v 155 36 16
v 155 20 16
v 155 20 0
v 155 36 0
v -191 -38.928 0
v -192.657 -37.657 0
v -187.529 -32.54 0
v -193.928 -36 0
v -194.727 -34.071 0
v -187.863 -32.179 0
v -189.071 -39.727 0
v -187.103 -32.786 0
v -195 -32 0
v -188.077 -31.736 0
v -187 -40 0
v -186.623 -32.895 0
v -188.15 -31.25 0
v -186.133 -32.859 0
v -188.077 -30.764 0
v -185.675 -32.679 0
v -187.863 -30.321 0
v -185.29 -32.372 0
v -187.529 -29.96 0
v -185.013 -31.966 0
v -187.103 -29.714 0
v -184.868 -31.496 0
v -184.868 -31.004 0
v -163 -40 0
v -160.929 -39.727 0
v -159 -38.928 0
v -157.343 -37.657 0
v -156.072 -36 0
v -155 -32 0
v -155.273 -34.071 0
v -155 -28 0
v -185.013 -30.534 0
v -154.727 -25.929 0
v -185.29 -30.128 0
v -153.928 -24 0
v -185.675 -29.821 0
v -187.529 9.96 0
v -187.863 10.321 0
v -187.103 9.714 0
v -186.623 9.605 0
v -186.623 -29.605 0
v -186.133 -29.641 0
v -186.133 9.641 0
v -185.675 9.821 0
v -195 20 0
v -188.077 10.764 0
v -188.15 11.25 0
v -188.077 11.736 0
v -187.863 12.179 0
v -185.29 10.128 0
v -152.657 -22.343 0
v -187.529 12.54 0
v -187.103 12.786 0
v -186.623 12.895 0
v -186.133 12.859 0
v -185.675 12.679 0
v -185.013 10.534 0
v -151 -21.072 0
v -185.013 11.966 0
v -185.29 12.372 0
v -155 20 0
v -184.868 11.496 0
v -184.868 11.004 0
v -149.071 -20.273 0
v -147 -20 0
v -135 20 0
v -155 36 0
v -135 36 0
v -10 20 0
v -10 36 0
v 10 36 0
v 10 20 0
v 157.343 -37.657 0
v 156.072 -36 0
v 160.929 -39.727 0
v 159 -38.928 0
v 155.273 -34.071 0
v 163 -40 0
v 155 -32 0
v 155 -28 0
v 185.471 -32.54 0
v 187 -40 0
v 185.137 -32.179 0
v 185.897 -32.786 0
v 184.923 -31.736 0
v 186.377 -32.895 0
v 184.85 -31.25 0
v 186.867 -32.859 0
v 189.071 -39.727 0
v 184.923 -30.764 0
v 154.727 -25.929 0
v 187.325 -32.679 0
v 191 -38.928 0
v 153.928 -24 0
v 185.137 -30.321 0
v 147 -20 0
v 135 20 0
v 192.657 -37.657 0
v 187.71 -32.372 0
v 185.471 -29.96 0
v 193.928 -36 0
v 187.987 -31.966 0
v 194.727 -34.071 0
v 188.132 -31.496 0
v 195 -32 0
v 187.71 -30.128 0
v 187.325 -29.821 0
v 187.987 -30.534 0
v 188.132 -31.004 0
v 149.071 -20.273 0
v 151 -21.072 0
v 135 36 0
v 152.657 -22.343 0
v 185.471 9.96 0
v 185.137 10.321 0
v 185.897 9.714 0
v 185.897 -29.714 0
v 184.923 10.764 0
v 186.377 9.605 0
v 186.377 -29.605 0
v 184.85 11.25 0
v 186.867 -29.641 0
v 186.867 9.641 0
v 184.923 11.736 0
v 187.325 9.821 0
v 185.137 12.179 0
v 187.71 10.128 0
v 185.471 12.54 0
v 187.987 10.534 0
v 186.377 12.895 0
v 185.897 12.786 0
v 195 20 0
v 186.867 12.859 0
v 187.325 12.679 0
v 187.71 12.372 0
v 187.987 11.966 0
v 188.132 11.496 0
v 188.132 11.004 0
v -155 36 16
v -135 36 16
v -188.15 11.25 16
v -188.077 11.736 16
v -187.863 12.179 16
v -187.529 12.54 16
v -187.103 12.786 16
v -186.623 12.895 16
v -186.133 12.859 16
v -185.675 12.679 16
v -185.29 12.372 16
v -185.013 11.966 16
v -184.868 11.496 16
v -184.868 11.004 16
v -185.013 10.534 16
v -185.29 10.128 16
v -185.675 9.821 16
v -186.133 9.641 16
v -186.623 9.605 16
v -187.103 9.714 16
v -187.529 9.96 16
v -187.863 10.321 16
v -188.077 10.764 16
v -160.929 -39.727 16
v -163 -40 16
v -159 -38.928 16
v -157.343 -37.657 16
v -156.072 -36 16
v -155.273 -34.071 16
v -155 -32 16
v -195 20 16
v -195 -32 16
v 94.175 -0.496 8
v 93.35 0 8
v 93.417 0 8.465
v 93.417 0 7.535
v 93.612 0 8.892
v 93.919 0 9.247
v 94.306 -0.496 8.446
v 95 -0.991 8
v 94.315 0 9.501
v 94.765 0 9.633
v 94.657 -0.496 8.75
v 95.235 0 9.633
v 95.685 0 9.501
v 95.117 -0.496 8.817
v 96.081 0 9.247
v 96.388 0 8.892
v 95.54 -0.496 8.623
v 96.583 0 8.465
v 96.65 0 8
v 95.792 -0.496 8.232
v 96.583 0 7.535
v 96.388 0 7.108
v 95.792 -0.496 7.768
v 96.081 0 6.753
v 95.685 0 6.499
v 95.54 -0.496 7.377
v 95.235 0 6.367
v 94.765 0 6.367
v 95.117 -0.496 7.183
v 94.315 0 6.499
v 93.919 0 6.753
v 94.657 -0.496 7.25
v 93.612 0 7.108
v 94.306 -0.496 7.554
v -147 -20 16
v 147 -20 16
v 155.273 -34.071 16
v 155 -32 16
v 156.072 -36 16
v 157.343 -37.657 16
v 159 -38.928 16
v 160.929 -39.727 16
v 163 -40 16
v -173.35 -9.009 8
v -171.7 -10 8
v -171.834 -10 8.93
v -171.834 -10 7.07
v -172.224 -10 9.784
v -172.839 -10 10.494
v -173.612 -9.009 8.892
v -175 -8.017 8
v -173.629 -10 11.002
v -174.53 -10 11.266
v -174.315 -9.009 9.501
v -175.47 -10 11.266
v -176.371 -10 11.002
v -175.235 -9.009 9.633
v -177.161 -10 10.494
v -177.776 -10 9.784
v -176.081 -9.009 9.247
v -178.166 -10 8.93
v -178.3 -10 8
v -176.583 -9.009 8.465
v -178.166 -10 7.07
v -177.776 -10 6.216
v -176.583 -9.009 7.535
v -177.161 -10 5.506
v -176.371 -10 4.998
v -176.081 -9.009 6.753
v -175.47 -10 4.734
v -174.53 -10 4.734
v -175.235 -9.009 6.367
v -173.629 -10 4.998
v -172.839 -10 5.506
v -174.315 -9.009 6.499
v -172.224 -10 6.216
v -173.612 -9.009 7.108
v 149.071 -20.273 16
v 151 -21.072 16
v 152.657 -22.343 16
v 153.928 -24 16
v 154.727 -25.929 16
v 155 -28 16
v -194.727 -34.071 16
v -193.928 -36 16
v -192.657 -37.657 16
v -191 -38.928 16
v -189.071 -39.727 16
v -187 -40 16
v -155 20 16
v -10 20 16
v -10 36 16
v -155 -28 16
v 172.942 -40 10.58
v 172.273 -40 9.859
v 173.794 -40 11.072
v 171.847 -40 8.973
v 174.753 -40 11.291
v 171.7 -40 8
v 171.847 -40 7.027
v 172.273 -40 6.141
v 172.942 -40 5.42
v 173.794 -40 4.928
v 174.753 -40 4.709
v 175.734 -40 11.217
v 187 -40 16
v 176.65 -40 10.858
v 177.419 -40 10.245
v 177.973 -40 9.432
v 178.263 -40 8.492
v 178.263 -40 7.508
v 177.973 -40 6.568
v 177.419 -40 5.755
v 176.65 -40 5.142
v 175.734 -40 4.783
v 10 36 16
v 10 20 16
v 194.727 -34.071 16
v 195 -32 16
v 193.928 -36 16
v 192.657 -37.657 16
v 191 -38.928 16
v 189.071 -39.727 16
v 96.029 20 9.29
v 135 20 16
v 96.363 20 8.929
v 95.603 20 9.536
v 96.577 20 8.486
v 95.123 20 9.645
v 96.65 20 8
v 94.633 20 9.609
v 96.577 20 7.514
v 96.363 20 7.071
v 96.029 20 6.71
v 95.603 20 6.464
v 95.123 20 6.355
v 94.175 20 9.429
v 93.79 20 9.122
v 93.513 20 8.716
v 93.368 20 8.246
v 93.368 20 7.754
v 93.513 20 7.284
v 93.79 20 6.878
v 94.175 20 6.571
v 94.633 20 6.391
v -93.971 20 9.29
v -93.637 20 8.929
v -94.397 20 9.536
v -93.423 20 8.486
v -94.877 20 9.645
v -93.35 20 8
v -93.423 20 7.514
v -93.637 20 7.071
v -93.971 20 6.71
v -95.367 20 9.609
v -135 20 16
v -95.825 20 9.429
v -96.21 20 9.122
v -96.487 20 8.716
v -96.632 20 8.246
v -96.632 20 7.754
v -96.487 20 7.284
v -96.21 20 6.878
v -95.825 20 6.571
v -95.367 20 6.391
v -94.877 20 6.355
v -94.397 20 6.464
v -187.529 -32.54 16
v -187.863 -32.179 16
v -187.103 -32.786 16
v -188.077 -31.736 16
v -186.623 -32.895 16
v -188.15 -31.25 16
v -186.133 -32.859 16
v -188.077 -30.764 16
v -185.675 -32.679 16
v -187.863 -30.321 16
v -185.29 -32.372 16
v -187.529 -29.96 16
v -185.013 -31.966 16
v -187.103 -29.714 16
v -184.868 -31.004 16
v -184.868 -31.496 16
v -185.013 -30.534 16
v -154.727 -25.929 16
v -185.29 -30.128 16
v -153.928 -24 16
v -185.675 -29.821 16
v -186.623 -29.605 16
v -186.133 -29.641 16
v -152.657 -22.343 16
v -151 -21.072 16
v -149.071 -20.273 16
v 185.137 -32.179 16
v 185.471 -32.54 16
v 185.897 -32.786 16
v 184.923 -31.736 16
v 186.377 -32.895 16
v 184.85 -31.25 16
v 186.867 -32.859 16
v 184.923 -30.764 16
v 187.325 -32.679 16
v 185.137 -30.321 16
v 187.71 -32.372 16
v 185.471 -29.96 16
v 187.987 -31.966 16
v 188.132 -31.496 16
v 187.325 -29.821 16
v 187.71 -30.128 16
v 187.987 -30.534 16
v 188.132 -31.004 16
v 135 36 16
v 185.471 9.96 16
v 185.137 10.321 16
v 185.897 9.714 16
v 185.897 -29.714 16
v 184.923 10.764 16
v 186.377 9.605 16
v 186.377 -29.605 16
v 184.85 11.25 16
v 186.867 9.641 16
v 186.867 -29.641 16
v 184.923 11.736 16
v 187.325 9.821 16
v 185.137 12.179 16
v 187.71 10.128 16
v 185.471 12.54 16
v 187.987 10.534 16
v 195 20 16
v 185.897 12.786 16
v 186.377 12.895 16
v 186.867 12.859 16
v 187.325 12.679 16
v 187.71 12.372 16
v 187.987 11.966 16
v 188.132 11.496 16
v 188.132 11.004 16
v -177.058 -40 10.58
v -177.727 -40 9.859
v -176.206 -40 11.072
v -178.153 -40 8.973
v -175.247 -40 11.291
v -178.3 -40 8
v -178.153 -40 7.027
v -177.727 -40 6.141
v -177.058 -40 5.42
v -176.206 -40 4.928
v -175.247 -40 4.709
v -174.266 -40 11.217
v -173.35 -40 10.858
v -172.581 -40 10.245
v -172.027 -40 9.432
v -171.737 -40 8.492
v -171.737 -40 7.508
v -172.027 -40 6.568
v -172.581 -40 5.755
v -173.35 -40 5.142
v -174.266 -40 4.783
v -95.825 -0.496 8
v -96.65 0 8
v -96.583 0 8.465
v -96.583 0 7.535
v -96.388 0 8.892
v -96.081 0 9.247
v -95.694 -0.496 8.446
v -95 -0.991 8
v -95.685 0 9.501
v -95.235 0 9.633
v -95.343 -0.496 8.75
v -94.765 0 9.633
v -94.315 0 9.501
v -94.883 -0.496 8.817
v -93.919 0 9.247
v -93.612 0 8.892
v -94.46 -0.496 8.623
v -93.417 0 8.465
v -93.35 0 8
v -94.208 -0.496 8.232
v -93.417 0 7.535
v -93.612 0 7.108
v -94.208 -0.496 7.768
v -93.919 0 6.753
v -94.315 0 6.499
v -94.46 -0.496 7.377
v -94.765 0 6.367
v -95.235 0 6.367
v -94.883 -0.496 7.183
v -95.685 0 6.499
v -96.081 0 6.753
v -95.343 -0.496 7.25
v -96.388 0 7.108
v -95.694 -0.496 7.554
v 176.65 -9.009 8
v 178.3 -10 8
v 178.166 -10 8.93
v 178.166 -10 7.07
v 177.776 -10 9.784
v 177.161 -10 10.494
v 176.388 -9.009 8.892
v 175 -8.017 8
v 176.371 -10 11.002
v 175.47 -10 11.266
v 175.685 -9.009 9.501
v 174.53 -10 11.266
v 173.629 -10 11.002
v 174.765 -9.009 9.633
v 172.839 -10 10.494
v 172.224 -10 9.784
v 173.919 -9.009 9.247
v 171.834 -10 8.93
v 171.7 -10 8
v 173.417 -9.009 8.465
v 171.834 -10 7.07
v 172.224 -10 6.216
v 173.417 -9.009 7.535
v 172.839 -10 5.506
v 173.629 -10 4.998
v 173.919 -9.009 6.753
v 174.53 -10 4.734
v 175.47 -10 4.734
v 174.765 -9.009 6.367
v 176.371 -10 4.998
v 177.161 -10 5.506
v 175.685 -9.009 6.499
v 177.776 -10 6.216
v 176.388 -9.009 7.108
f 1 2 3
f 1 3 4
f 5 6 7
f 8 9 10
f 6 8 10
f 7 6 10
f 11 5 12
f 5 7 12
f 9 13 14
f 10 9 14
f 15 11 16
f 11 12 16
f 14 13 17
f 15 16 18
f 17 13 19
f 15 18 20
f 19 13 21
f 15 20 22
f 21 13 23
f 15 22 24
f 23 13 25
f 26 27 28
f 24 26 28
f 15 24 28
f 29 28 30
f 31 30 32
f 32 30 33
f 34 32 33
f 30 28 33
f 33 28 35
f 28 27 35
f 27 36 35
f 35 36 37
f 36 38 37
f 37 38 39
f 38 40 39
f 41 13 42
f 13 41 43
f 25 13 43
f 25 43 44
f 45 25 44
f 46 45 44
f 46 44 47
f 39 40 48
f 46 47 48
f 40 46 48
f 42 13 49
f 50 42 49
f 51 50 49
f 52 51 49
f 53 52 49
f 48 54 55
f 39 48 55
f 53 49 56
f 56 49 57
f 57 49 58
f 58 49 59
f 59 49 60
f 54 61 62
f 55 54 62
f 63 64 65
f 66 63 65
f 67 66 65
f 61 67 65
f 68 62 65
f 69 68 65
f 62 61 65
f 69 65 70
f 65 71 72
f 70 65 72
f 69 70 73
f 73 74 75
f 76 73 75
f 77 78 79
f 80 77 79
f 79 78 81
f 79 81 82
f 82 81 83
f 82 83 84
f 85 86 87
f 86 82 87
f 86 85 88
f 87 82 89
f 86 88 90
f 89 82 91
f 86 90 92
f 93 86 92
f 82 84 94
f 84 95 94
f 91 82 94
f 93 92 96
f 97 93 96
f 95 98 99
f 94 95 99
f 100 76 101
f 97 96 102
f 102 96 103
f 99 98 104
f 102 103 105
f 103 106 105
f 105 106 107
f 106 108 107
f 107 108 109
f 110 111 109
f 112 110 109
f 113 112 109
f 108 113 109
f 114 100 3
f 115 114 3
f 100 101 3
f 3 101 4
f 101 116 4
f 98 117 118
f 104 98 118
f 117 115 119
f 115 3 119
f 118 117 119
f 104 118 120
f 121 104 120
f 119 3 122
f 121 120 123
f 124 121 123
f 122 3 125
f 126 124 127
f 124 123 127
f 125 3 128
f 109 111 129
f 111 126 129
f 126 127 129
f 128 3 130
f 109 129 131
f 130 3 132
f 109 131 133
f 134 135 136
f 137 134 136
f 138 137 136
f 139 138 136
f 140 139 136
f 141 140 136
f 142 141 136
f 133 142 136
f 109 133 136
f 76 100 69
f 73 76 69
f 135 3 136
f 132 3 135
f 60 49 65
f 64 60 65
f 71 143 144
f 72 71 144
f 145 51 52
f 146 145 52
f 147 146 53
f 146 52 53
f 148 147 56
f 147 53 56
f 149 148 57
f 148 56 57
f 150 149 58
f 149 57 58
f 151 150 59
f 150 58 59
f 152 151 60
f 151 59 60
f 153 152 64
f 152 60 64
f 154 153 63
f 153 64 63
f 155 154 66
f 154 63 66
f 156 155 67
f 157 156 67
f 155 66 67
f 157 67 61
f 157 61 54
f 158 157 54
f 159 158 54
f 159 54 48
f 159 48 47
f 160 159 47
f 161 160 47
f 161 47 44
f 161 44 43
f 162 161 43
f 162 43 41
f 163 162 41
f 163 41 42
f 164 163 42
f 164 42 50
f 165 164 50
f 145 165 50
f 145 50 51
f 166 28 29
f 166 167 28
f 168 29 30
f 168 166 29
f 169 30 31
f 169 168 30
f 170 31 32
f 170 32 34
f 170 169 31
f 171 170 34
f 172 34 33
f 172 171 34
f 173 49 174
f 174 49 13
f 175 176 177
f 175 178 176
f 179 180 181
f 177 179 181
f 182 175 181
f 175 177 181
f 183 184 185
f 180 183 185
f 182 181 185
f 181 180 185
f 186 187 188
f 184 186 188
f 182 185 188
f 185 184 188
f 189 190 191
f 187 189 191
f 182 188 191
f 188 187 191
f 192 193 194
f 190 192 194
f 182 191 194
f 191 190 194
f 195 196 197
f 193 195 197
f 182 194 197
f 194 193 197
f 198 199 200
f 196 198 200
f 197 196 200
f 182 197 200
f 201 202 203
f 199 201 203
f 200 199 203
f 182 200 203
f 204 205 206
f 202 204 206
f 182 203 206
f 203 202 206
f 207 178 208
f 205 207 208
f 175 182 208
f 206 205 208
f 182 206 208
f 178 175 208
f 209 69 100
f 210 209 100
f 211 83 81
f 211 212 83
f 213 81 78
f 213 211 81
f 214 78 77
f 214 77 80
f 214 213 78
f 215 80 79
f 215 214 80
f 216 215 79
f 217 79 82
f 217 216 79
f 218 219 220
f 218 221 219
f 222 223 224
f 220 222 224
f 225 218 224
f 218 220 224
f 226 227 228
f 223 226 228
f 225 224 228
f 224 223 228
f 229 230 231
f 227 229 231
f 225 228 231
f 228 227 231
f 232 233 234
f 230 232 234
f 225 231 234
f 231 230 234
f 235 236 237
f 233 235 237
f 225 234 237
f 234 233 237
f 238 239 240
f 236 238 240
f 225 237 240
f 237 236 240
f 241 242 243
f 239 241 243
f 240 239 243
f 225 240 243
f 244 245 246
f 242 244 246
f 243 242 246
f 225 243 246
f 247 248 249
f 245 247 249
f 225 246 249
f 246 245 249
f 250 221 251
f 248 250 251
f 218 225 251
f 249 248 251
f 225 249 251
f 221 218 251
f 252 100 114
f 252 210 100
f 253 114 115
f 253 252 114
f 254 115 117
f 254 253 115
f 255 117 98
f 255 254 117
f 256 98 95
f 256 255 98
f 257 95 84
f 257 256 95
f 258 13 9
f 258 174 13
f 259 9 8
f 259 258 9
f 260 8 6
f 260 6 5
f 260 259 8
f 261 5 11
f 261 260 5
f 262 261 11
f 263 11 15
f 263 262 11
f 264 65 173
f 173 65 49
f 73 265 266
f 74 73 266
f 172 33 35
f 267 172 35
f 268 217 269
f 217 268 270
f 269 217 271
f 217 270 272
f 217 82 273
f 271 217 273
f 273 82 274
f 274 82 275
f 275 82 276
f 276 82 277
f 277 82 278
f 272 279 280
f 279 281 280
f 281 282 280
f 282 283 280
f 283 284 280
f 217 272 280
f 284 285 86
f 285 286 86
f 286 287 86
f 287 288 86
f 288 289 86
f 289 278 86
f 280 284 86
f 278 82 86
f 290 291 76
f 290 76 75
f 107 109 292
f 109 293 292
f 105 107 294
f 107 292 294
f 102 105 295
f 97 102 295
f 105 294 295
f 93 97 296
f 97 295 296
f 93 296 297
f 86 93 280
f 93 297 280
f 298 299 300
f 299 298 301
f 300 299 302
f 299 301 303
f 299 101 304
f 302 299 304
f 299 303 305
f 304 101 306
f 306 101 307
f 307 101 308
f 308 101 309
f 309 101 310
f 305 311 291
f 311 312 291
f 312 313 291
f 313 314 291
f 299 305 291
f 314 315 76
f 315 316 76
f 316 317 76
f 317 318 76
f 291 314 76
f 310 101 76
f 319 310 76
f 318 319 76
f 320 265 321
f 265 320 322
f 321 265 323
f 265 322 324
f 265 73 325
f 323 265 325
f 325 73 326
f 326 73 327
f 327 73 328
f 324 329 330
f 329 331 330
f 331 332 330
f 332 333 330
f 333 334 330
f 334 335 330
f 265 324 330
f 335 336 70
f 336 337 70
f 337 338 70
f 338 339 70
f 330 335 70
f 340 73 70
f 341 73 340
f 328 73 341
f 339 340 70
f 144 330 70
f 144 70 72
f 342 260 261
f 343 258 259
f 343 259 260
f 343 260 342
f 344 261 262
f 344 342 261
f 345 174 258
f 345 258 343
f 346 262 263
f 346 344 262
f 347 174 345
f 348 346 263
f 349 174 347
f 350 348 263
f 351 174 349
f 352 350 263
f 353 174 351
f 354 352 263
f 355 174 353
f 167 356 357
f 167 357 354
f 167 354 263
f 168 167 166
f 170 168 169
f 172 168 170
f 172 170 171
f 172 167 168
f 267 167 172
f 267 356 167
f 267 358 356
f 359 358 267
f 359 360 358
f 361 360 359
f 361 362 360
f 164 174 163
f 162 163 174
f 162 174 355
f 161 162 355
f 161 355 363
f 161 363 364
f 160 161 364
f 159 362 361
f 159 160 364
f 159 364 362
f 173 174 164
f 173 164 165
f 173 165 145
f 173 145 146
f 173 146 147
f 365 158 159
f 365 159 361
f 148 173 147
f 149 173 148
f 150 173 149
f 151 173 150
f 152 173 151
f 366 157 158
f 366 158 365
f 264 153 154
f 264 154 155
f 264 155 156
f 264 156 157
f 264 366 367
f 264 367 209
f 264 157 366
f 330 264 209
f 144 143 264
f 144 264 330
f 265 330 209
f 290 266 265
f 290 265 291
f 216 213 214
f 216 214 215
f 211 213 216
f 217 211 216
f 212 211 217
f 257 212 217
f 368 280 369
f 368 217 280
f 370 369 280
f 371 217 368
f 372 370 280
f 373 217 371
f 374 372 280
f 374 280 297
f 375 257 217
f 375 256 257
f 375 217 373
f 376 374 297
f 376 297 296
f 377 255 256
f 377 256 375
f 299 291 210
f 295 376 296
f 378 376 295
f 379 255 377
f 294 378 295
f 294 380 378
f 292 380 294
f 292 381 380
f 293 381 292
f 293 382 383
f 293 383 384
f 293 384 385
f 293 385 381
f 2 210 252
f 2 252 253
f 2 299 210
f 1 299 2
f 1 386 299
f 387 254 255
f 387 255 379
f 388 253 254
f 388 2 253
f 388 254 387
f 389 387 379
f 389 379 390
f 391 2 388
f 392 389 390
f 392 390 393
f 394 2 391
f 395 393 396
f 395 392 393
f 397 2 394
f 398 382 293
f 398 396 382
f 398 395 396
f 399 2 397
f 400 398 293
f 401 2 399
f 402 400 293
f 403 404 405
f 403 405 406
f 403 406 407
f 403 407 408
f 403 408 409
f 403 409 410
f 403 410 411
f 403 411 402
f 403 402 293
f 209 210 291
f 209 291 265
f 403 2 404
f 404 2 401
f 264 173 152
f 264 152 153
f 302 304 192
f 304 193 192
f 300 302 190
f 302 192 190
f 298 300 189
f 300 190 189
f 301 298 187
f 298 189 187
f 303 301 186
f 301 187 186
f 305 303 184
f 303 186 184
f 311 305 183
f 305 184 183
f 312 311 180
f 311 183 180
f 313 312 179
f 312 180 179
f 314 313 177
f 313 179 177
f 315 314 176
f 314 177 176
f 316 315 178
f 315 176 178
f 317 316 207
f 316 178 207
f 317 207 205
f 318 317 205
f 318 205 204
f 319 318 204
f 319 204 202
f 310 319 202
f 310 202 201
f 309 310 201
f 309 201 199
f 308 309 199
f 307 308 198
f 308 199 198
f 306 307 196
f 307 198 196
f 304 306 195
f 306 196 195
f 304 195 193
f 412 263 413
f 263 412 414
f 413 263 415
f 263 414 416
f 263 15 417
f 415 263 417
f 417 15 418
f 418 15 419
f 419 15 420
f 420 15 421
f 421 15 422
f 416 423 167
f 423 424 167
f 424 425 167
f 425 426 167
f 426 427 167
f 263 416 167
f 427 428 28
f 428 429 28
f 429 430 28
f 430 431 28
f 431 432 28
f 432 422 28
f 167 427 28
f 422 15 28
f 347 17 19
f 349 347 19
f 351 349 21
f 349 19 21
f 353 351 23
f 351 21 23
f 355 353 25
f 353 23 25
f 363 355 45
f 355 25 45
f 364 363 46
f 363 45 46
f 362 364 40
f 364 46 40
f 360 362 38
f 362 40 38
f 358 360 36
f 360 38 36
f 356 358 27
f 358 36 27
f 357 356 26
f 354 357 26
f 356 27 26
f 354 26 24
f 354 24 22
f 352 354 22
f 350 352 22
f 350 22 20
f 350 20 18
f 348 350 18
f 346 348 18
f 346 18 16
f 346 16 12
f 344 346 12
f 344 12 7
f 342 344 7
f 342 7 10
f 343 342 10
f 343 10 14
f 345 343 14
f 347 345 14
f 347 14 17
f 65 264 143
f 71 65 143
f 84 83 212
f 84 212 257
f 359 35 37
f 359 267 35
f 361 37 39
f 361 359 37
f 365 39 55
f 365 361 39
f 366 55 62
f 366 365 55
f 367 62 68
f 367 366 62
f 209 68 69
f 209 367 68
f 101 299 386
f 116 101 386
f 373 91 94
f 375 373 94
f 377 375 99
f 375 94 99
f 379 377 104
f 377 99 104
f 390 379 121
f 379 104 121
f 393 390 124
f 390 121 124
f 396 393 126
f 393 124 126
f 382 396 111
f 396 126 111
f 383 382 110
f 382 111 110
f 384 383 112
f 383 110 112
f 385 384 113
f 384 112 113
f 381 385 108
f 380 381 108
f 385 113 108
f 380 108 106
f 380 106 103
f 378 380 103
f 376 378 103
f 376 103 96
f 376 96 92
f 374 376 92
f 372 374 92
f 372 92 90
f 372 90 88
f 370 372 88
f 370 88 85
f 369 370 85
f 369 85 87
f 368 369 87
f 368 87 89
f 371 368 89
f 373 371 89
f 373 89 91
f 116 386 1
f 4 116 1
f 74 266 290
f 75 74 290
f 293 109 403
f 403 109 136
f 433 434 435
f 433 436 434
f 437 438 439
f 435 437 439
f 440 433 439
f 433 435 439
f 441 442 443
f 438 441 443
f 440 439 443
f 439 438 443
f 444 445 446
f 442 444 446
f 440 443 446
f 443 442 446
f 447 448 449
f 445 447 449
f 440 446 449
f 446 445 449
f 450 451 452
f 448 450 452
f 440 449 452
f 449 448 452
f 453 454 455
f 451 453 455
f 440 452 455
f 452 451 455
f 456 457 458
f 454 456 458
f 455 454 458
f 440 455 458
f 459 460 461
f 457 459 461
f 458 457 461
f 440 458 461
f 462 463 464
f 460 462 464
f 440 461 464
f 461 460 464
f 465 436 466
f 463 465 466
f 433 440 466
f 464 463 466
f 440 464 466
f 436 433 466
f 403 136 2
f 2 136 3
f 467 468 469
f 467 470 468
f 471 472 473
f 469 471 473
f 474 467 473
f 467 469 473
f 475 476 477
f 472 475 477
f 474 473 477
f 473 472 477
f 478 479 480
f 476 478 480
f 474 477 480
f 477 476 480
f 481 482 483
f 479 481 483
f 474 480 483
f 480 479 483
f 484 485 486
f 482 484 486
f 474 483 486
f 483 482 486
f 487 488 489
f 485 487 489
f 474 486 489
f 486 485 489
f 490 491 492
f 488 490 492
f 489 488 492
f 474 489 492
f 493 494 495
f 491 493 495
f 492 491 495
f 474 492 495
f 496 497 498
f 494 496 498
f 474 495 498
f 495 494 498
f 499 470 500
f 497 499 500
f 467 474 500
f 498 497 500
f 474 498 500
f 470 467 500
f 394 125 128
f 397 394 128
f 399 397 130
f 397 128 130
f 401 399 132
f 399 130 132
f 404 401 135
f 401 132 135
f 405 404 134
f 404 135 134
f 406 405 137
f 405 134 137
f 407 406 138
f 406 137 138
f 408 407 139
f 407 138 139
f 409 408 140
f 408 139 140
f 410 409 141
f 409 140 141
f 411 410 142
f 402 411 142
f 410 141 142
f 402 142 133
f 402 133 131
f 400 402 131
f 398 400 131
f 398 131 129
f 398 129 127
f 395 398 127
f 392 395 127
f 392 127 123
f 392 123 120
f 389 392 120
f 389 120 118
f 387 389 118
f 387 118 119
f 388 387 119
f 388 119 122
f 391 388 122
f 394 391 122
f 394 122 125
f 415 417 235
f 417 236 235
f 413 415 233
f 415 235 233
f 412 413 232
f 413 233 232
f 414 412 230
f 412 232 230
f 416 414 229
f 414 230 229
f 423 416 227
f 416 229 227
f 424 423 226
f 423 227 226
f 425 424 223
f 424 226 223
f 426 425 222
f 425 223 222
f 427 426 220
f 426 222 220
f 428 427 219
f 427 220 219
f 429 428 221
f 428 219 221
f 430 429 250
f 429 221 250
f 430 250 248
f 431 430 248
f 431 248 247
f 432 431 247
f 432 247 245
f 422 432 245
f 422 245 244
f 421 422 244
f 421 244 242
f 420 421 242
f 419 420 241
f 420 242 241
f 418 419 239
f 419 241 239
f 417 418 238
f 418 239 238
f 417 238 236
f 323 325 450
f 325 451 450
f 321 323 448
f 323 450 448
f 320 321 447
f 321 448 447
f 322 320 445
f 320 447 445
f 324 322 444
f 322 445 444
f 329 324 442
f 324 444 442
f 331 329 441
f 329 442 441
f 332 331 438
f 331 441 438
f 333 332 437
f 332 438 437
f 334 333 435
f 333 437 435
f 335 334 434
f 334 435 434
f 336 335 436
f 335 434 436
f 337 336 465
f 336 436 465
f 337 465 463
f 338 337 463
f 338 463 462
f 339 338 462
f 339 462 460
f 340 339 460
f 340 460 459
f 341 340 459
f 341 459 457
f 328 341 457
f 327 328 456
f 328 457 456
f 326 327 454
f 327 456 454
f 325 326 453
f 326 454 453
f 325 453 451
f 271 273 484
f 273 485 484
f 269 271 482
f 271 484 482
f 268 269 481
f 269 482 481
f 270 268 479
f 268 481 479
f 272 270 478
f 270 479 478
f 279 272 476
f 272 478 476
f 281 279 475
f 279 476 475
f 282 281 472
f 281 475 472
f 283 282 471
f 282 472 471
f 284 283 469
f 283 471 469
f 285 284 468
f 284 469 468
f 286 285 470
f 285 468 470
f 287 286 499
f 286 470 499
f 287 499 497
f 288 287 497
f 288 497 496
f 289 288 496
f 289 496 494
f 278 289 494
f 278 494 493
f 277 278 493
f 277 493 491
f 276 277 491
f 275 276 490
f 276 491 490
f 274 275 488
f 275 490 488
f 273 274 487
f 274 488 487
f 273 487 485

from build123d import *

# Parameters (mm, degrees)
F0_W     = 40
F0_H     = 20
F1_DEPTH = 16
F2_W     = 20
F2_H     = 16
F3_DEPTH = 16
F5_D     = 6.6
F5_DEPTH = 30
F5_TIP   = 1.9828400428
F6_R     = 8
F8_D     = 3.3
F8_DEPTH = 20
F8_TIP   = 0.9914200214
F10_D    = 3.3


with BuildPart() as f1:
    # F0 (on Top) → F1 (new body)
    with BuildSketch(Plane.XY):
        Polygon((195, -20), (195, 20), (-195, 20), (-195, -20), (-155, -20), (155, -20), align=None)
        with Locations((-175, -30)):
            Rectangle(F0_W, F0_H)
        with Locations((175, -30)):
            Rectangle(F0_W, F0_H)
    extrude(amount=F1_DEPTH)

    # F2 (on face) → F3 (join, through all)
    with BuildSketch(Plane.XY.offset(16)):
        with Locations((145, 28)):
            Rectangle(F2_W, F2_H)
        with Locations((0, 28)):
            Rectangle(F2_W, F2_H)
        with Locations((-145, 28)):
            Rectangle(F2_W, F2_H)
    extrude(amount=-F3_DEPTH)

    # F5
    with Locations(Plane.XZ.offset(40)):
        with Locations((-175, 8), (175, 8)):
            Hole(F5_D / 2, depth=F5_DEPTH)
            with Locations((0, 0, -(F5_DEPTH + F5_TIP / 2))):  # 118° drill point
                Cone(0, F5_D / 2, F5_TIP, mode=Mode.SUBTRACT)

    # F6
    f6_edges = [f1.edges().sort_by_distance(p)[0] for p in [
        (-155, -40, 8),
        (-155, -20, 8),
        (-195, -40, 8),
        (195, -40, 8),
        (155, -40, 8),
        (155, -20, 8),
    ]]
    fillet(f6_edges, radius=F6_R)

    # F8
    with Locations(Plane(origin=(0, 20, 0), x_dir=(-1, 0, 0), z_dir=(0, 1, 0))):
        with Locations((95, 8), (-95, 8)):
            Hole(F8_D / 2, depth=F8_DEPTH)
            with Locations((0, 0, -(F8_DEPTH + F8_TIP / 2))):  # 118° drill point
                Cone(0, F8_D / 2, F8_TIP, mode=Mode.SUBTRACT)

    # F10 (through all)
    with Locations(Plane.XY.offset(16)):
        with Locations((-186.5, 11.25), (-186.5, -31.25), (186.5, 11.25), (186.5, -31.25)):
            Hole(F10_D / 2)


solid = f1.part
